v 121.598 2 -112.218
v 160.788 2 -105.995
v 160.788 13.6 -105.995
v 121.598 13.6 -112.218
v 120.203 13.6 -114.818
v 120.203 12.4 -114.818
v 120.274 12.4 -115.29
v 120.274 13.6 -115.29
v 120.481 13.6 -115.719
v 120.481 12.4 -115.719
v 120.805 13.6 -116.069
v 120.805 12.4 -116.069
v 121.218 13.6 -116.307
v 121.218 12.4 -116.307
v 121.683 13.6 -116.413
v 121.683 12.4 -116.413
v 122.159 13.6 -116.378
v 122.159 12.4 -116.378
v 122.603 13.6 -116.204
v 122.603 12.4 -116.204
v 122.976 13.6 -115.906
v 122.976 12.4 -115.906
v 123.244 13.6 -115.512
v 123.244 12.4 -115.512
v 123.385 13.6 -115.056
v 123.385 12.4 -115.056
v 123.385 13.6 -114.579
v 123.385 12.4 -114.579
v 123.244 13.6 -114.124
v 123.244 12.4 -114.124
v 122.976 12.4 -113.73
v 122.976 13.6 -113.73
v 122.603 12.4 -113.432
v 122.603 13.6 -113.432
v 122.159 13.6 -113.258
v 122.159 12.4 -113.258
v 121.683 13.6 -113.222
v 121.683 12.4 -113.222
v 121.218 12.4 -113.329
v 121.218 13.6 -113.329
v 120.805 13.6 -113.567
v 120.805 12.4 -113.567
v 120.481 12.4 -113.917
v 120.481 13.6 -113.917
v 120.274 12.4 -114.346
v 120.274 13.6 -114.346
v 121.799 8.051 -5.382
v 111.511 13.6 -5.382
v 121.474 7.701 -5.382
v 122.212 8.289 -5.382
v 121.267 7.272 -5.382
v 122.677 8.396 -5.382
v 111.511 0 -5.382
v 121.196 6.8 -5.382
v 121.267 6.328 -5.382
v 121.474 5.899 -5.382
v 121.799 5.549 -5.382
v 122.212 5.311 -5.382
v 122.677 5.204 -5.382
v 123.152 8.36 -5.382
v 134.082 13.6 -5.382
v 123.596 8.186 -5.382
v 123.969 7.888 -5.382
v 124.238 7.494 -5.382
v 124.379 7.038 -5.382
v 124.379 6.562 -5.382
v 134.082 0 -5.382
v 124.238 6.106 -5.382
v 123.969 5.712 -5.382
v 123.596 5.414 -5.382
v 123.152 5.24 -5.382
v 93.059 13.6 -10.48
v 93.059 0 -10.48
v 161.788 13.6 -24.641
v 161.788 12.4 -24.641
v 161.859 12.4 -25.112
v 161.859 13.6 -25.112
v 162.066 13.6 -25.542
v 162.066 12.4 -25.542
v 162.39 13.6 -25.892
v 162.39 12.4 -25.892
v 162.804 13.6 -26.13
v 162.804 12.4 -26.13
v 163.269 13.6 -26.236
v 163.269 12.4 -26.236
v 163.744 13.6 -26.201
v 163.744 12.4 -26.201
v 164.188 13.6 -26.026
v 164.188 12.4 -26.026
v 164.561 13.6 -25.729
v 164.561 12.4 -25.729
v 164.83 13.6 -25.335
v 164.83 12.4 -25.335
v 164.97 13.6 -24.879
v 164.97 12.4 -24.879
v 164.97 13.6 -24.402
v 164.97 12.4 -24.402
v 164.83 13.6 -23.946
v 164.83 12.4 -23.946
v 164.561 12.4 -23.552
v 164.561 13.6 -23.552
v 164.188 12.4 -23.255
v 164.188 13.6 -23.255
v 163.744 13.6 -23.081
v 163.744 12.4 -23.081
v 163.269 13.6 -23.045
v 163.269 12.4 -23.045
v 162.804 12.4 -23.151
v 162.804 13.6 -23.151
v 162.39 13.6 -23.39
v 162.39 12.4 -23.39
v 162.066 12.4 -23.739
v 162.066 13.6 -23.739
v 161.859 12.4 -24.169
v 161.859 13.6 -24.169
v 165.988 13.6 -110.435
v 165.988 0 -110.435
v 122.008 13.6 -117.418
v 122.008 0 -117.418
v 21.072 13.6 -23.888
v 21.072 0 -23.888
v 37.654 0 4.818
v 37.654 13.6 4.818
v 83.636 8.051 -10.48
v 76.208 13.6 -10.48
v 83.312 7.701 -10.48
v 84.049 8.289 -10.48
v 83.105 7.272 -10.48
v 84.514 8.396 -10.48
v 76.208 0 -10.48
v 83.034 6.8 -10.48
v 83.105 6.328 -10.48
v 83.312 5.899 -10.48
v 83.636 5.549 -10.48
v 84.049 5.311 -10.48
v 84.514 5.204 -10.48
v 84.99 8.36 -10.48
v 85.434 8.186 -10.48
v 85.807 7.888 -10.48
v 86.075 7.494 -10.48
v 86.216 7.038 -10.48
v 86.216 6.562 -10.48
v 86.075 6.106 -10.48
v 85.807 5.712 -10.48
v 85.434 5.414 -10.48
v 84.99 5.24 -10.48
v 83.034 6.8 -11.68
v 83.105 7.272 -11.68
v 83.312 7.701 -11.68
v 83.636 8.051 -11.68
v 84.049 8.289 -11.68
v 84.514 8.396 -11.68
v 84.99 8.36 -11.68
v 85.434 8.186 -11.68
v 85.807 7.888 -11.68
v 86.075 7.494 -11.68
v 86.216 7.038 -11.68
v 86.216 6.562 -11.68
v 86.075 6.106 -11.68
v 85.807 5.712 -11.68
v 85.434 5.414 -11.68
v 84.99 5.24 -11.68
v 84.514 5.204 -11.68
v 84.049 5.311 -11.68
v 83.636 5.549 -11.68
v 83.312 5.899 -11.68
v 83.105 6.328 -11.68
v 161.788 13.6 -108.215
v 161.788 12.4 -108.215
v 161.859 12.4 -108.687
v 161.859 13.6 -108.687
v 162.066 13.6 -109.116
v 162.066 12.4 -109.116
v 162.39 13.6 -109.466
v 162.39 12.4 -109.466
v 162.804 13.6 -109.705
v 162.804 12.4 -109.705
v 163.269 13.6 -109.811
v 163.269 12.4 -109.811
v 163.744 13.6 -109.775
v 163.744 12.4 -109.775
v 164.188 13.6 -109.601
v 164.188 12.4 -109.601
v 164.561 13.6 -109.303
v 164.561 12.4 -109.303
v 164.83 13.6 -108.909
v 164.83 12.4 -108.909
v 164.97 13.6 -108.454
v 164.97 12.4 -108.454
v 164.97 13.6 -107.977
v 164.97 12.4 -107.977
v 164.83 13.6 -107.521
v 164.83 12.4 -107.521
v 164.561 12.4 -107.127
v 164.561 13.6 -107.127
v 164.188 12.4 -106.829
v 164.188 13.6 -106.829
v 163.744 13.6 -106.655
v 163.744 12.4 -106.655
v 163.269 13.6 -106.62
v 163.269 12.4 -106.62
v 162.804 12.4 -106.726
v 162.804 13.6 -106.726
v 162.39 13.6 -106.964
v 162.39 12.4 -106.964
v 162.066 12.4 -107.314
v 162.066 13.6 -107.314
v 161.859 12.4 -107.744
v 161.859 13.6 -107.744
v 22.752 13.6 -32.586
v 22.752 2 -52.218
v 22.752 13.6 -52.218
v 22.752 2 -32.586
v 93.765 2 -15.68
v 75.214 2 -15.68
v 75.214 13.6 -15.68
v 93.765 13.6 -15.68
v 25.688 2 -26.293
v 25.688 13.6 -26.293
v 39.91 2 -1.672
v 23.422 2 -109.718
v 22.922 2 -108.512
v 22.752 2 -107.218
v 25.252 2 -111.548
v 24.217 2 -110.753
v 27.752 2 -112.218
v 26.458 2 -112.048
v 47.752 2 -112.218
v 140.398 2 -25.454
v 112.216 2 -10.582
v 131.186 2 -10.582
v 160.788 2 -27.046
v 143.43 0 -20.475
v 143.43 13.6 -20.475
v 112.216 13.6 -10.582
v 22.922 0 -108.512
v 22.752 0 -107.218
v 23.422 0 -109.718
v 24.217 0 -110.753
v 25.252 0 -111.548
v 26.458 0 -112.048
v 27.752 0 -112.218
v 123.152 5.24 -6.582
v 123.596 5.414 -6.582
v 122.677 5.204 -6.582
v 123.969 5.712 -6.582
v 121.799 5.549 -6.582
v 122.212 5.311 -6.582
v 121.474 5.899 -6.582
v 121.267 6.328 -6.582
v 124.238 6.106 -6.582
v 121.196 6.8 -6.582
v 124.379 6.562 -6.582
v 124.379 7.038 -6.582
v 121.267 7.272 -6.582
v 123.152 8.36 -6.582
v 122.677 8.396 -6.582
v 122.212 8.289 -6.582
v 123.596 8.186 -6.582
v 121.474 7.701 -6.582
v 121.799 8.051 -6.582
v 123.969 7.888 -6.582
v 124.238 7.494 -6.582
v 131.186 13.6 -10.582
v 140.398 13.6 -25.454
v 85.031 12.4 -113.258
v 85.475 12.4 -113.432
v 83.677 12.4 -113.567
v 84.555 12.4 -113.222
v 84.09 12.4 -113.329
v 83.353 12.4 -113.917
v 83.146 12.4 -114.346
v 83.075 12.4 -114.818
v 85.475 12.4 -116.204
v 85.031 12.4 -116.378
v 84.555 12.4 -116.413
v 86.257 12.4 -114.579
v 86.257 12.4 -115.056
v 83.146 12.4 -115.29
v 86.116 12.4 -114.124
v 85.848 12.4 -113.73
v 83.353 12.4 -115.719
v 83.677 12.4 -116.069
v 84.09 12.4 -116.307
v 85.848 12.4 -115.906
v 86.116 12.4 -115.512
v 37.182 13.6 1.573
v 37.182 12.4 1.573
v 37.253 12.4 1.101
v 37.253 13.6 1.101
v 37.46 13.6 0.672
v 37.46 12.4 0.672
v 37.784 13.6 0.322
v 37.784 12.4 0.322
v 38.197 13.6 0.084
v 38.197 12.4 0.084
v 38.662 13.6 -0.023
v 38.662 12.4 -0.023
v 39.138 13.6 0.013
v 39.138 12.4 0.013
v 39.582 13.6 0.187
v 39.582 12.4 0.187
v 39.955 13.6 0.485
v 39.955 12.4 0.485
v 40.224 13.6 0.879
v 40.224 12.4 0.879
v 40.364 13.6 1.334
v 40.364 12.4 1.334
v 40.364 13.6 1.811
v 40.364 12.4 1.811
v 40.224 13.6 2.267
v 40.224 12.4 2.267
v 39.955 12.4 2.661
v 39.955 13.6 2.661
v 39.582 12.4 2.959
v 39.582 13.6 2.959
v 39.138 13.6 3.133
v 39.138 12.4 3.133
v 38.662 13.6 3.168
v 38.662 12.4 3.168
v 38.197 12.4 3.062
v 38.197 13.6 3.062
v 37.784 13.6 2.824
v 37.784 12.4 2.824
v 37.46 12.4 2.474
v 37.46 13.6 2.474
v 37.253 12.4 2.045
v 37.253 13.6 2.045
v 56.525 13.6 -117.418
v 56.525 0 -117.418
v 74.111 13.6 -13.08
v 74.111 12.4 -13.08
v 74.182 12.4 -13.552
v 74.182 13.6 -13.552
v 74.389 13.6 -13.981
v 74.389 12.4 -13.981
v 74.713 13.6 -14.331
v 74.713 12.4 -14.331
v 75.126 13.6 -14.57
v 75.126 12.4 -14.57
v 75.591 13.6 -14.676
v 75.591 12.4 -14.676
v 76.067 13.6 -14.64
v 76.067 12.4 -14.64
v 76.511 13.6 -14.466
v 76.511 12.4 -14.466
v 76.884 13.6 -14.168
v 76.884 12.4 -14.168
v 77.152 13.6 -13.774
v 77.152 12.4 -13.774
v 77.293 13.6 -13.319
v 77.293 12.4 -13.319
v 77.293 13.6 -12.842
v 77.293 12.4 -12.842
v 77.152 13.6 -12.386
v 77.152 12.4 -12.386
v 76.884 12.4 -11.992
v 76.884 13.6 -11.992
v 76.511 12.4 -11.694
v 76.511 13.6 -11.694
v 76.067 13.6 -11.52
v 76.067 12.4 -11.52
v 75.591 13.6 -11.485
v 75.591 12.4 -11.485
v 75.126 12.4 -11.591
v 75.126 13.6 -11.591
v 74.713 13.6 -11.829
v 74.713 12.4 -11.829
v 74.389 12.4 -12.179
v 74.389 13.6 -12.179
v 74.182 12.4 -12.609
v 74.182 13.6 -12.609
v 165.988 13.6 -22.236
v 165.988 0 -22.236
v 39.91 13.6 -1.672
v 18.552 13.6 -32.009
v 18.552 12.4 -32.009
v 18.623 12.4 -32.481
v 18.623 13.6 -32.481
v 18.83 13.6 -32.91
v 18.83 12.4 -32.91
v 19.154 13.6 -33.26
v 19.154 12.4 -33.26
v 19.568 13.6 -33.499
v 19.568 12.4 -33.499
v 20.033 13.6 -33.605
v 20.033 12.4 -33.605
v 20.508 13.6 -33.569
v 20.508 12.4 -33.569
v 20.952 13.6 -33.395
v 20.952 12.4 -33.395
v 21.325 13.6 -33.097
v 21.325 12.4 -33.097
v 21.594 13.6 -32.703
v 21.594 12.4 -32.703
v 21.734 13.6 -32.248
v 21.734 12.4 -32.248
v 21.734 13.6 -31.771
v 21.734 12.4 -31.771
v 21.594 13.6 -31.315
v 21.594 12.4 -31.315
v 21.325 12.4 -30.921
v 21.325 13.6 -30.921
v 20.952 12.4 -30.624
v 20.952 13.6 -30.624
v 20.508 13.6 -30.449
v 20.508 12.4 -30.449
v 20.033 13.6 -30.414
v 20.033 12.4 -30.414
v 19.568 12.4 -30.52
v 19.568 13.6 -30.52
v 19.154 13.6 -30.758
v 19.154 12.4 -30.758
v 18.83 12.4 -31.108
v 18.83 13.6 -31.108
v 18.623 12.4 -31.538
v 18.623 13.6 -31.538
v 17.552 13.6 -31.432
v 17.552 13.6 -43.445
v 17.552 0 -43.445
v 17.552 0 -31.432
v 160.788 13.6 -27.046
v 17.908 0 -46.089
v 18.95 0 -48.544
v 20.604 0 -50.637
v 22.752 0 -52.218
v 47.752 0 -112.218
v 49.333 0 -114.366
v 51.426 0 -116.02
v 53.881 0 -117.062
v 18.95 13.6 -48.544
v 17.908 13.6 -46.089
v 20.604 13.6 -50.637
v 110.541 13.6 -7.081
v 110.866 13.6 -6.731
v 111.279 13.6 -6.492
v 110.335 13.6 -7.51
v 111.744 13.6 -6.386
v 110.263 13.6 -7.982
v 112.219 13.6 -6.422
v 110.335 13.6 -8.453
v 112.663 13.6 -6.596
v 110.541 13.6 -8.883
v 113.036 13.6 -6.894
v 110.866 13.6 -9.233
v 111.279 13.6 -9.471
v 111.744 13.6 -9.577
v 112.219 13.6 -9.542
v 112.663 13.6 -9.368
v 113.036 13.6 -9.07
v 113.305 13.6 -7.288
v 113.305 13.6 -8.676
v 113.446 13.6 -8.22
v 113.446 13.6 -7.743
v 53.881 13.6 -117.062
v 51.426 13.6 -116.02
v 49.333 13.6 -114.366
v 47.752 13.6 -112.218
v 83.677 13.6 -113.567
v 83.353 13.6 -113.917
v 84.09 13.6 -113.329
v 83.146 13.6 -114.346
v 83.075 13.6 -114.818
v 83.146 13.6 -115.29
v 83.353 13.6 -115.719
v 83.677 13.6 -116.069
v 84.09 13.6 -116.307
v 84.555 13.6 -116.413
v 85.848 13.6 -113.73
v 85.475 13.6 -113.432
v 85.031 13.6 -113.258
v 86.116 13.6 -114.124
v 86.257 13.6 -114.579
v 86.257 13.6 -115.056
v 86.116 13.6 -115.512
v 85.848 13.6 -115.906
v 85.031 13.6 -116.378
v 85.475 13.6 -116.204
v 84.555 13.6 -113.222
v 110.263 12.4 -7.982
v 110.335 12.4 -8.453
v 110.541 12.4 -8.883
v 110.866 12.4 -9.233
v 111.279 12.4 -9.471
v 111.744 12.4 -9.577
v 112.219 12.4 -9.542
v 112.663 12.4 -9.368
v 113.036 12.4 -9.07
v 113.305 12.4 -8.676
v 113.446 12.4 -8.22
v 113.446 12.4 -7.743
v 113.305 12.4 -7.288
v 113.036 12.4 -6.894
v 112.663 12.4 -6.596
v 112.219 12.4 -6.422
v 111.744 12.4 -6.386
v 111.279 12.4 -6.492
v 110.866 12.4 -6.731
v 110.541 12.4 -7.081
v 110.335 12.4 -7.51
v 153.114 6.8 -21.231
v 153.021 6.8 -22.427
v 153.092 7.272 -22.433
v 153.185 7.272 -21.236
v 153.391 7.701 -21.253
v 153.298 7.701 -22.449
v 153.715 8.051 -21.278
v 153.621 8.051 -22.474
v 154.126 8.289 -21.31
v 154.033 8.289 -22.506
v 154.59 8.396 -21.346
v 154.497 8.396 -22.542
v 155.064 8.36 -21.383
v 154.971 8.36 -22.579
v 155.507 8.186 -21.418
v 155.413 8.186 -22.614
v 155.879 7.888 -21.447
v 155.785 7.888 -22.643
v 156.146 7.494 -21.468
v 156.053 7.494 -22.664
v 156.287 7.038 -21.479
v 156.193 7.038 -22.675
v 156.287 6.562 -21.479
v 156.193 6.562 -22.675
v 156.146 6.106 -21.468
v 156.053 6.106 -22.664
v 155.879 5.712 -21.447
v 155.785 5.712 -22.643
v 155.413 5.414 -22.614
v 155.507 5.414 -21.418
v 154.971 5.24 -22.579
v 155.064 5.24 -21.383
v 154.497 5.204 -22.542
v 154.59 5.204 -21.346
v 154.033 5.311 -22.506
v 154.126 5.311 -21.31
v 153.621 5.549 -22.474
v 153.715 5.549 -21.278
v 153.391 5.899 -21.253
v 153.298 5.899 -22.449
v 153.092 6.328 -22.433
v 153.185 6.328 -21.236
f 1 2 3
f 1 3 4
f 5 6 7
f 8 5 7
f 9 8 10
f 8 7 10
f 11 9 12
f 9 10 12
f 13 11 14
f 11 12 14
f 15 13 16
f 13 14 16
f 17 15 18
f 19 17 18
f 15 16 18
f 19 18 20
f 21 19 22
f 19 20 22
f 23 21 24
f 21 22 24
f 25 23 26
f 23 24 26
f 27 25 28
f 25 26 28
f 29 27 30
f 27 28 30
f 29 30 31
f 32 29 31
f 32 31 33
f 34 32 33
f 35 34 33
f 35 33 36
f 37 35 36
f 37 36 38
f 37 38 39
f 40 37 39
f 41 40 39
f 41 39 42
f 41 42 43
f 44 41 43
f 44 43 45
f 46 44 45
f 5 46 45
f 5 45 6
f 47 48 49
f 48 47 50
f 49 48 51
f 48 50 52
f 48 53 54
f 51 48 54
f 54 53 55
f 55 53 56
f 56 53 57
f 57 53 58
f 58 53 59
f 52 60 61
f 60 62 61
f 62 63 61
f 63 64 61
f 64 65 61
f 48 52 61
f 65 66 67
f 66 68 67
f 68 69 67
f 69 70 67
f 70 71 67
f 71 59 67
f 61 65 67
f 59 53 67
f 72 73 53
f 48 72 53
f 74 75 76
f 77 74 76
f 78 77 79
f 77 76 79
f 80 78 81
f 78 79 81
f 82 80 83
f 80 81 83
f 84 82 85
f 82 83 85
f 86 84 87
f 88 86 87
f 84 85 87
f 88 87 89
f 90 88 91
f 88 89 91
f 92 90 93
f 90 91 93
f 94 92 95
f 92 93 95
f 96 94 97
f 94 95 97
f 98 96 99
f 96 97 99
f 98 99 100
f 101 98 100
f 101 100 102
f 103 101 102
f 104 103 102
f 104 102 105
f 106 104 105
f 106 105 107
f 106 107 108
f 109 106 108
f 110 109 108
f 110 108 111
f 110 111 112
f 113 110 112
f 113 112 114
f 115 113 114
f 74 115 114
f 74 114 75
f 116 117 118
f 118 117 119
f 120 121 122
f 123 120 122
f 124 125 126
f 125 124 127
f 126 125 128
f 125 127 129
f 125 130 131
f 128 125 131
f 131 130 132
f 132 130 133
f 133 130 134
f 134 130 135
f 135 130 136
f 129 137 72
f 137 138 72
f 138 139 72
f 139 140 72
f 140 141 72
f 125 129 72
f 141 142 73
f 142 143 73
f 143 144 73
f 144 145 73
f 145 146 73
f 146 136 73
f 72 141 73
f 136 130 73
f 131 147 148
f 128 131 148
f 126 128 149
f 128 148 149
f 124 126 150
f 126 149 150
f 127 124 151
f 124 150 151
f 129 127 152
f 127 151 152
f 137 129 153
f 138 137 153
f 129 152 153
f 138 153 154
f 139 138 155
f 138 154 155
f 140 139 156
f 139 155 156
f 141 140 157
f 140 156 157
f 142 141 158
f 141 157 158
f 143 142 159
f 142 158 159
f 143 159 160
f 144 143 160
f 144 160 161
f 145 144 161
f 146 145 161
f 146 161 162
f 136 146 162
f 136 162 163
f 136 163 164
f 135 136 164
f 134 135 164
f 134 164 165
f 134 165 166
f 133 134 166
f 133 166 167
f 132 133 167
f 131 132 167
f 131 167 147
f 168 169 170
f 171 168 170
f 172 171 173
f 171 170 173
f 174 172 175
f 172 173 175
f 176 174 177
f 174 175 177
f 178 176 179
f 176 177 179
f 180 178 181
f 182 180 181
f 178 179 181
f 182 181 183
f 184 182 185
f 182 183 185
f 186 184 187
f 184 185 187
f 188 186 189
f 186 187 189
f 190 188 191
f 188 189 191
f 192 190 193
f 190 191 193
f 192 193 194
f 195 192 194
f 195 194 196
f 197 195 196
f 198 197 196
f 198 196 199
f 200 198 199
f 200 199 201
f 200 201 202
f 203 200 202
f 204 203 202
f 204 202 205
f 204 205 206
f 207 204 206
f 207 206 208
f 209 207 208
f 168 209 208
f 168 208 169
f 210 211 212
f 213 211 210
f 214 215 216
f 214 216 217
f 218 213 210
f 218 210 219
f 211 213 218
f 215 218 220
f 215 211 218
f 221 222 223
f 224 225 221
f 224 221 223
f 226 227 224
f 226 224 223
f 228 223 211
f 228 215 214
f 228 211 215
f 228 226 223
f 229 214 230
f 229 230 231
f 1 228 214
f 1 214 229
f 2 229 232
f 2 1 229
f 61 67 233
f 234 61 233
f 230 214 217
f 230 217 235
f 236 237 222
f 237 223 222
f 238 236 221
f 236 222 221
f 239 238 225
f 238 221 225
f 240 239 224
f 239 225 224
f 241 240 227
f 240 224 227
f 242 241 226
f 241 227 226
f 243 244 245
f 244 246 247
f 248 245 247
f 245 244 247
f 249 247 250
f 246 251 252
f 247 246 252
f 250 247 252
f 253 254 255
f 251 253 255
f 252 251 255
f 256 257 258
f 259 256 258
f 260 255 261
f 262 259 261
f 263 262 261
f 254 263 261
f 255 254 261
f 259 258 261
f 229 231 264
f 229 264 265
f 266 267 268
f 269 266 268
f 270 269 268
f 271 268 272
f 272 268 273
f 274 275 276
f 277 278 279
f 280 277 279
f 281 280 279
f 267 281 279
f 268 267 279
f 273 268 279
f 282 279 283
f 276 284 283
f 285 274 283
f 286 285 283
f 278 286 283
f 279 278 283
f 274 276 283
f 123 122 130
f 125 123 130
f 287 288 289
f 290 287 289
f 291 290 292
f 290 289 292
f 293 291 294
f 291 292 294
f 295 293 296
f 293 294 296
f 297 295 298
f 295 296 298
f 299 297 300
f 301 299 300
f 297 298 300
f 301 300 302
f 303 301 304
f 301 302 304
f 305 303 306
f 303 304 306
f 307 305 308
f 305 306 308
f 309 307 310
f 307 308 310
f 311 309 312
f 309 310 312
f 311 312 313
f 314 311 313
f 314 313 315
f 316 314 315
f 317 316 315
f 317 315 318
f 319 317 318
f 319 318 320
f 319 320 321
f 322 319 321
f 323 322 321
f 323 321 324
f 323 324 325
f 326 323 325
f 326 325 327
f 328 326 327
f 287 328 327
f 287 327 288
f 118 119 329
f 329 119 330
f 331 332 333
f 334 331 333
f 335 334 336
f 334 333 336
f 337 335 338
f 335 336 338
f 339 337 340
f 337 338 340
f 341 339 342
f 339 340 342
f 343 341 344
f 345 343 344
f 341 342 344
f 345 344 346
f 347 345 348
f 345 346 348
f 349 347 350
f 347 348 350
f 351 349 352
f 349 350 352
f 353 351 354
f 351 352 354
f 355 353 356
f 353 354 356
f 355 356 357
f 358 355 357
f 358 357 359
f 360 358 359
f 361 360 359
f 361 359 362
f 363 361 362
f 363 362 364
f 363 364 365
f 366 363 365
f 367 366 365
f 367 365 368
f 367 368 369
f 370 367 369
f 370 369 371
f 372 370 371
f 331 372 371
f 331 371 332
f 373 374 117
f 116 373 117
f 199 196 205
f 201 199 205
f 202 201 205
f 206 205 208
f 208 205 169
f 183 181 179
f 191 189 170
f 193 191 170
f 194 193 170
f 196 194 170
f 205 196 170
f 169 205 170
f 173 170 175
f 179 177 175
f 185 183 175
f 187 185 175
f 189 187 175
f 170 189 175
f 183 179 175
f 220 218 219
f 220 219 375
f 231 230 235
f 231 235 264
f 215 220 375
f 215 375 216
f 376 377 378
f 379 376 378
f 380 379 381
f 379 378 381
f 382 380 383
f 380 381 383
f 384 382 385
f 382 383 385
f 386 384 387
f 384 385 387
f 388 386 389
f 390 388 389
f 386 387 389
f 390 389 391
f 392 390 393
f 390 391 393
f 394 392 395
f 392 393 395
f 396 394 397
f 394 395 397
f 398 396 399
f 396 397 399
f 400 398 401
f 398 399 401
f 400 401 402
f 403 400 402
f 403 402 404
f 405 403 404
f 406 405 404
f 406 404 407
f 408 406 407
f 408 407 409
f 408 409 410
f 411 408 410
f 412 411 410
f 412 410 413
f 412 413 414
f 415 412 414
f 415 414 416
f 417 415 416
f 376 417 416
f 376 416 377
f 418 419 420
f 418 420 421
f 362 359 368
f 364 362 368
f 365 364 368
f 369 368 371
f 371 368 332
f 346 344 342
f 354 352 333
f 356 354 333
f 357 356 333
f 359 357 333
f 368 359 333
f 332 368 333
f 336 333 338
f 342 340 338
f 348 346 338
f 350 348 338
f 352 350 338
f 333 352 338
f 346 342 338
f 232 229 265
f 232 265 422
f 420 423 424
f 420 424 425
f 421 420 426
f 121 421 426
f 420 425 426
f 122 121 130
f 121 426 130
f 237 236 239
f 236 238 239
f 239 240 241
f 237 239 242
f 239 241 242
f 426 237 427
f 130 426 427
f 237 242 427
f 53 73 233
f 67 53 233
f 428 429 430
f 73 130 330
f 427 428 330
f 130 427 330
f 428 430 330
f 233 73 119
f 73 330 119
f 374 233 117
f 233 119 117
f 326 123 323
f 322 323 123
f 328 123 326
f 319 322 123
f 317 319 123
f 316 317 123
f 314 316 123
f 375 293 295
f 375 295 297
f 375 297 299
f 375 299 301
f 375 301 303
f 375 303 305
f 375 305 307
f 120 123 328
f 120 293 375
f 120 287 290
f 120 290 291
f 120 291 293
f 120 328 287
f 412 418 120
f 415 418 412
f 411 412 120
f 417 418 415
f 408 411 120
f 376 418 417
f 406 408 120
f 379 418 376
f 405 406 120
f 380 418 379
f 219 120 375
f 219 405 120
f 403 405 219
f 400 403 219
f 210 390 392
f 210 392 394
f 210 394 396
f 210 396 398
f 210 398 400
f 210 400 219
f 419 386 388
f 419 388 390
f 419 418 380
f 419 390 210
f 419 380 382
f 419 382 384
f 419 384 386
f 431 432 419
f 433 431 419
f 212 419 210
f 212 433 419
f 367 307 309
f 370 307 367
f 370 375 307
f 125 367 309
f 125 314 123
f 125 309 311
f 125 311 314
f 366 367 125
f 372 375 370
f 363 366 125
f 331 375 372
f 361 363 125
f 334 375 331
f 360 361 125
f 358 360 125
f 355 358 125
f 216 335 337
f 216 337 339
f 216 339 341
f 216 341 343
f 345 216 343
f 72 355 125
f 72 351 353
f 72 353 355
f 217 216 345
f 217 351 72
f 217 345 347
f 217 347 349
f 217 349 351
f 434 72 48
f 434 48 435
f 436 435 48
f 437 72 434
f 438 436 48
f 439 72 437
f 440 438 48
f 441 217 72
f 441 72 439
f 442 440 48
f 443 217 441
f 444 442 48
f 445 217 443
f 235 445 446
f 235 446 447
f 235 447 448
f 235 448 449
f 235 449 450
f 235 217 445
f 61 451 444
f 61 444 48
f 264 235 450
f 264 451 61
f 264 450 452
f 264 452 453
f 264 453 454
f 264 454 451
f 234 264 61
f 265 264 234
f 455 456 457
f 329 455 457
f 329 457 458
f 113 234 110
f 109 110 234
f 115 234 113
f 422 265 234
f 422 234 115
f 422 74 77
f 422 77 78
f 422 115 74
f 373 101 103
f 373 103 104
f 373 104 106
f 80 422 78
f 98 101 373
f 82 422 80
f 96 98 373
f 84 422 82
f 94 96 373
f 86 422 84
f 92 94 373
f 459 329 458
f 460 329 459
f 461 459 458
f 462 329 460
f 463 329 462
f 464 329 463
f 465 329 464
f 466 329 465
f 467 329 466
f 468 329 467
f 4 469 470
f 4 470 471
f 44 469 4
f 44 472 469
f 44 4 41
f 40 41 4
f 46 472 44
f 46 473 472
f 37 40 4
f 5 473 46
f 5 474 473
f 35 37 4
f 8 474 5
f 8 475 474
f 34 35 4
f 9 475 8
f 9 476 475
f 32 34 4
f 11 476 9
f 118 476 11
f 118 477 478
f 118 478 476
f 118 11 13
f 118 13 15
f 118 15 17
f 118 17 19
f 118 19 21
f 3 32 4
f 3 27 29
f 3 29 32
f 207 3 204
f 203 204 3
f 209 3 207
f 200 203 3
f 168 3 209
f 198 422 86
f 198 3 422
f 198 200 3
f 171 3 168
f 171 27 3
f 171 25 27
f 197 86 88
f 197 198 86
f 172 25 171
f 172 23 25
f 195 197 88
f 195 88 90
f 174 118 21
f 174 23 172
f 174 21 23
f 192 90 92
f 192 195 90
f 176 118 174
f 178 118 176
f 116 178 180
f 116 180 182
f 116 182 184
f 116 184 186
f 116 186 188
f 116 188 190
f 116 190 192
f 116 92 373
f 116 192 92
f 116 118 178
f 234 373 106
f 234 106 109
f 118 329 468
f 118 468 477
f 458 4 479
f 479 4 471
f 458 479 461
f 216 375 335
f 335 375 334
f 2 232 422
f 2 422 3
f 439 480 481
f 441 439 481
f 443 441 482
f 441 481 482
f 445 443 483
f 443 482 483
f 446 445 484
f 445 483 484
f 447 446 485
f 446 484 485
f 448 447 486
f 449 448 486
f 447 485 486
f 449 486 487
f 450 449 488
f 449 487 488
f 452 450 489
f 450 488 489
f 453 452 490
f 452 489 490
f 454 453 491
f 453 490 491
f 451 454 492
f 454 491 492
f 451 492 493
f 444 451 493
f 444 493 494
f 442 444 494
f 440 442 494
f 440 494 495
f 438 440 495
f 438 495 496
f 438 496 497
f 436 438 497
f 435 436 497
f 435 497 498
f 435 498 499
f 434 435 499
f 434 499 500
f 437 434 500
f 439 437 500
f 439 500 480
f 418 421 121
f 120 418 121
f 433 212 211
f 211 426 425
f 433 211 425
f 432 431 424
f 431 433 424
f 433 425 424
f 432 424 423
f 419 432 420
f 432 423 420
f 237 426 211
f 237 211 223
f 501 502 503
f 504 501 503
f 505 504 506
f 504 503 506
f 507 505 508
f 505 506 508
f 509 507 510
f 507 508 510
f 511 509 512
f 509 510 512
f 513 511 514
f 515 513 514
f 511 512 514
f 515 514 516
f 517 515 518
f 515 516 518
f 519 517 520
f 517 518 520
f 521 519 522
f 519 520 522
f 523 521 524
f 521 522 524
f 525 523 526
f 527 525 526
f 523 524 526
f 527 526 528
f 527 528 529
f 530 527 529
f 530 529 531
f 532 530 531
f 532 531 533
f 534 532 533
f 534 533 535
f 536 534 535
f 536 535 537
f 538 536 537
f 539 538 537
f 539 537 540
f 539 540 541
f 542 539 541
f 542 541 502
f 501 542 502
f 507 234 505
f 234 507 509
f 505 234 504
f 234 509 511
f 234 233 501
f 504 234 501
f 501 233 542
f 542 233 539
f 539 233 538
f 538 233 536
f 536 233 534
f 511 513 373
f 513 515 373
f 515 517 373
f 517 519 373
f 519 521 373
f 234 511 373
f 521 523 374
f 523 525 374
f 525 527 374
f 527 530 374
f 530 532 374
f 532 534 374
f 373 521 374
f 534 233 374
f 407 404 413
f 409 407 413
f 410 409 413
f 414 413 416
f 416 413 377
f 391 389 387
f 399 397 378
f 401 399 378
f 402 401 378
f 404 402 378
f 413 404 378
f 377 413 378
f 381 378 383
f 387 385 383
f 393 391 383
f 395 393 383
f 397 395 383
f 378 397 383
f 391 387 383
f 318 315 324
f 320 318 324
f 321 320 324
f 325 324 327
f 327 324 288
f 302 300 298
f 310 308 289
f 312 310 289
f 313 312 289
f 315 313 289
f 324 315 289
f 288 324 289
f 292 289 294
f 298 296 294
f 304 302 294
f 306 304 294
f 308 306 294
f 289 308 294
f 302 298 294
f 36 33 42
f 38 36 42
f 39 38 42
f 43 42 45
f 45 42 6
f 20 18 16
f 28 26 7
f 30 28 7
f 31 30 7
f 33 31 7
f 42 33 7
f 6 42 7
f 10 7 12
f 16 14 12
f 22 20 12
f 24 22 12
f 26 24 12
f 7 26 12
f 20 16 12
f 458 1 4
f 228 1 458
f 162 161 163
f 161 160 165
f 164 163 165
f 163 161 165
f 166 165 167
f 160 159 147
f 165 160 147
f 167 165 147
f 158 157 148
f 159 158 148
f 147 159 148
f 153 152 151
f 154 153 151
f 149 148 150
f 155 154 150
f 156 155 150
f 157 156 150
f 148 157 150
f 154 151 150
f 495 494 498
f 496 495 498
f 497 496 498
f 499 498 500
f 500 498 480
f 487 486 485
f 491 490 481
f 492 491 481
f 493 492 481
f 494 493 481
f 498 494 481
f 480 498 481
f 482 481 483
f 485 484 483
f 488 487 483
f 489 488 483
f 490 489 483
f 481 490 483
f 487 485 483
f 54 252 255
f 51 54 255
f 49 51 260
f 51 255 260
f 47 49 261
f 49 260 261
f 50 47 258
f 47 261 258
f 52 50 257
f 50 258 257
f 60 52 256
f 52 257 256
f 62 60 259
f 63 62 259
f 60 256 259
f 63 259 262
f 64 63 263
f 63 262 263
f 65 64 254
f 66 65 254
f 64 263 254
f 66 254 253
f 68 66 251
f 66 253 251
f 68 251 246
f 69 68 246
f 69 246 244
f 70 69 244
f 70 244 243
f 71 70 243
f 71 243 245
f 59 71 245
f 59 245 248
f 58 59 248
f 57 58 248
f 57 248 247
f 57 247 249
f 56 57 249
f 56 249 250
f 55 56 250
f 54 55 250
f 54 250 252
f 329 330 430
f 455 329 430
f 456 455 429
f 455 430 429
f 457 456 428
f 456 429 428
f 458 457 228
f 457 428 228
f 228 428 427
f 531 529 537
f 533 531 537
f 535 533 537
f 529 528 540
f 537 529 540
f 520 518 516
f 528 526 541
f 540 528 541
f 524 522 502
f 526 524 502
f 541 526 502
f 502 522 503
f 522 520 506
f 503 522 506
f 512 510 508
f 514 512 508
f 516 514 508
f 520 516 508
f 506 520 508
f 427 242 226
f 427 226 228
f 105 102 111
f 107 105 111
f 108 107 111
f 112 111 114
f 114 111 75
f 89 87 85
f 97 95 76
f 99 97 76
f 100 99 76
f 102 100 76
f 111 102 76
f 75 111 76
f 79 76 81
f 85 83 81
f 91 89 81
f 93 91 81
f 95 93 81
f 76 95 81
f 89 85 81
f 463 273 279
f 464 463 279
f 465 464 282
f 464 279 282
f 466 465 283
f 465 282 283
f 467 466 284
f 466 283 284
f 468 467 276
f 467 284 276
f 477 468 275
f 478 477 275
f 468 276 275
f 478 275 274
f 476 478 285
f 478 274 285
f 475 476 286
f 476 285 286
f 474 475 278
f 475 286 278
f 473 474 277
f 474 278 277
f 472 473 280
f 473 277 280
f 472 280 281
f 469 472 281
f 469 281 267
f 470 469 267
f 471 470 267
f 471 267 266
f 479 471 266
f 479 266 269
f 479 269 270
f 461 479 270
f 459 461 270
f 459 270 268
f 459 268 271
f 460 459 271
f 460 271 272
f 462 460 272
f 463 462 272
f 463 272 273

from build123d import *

# Parameters (mm, degrees)
BOSS_EXTRUDE1_DEPTH = 2
BOSS_EXTRUDE2_DEPTH = 13.6
CUT_EXTRUDE1_DEPTH  = 204.774312539
TOP_HOLES_D         = 3.2
TOP_HOLES_DEPTH     = 1.2
WRIST_1_D           = 3.2
WRIST_1_DEPTH       = 1.2
WRIST_2_D           = 3.2
WRIST_2_DEPTH       = 1.2
WRIST_3_D           = 3.2
WRIST_3_DEPTH       = 1.2
FILLET1_R           = 5
FILLET2_R           = 10
FILLET3_R           = 10


with BuildPart() as part:
    # outline → Boss-Extrude1 (new body)
    with BuildSketch(Plane(origin=(0, 0, 0), x_dir=(1, 0, 0), z_dir=(0, 1, 0))):
        Polygon((22.752080985, 112.217917805), (22.752080985, 32.585832501), (25.688129691, 26.292829341), (39.910245267, 1.671913524), (75.213887712, 15.680109343), (93.764616437, 15.680109343), (112.21601573, 10.581860359), (131.186066133, 10.581860359), (140.397681326, 25.454275085), (160.788080985, 27.045655036), (160.788080985, 105.9953847), (121.597788595, 112.217917805), align=None)
    extrude(amount=BOSS_EXTRUDE1_DEPTH)

    # outline<7> → Boss-Extrude2 (add)
    with BuildSketch(Plane(origin=(0, 0, 0), x_dir=(1, 0, 0), z_dir=(0, 1, 0))):
        Polygon((165.988080985, 110.434880876), (122.008040315, 117.417917805), (17.552080985, 117.417917805), (17.552080985, 31.432460189), (21.071788866, 23.888466533), (37.653795388, -4.817824349), (76.207852469, 10.480109343), (93.059430407, 10.480109343), (111.510829699, 5.381860359), (134.081949487, 5.381860359), (143.430369308, 20.475150048), (165.988080985, 22.235679058), align=None)
        Polygon((121.597788595, 112.217917805), (22.752080985, 112.217917805), (22.752080985, 32.585832501), (25.688129691, 26.292829341), (39.910245267, 1.671913524), (75.213887712, 15.680109343), (93.764616437, 15.680109343), (112.21601573, 10.581860359), (131.186066133, 10.581860359), (140.397681326, 25.454275085), (160.788080985, 27.045655036), (160.788080985, 105.9953847), align=None, mode=Mode.SUBTRACT)
    extrude(amount=BOSS_EXTRUDE2_DEPTH)

    # cutout → Cut-Extrude1 (cut, through all)
    with BuildSketch(Plane(origin=(0, 0, 0), x_dir=(1, 0, 0), z_dir=(0, 1, 0))):
        Polygon((17.552080985, 117.417917805), (17.552080985, 52.217917805), (22.752080985, 52.217917805), (22.752080985, 112.217917805), (47.752080985, 112.217917805), (47.752080985, 117.417917805), align=None)
    extrude(amount=CUT_EXTRUDE1_DEPTH, mode=Mode.SUBTRACT)

    # top holes
    with Locations(Plane(origin=(0, 13.6, 0), x_dir=(1, 0, 0), z_dir=(0, 1, 0))):
        with Locations((84.67493479, 114.817917805), (20.152080985, 32.009146345), (38.782020327, -1.572955412), (75.710870091, 13.080109343), (111.863422715, 7.981860359), (163.388080985, 24.640667047), (163.388080985, 108.215132788), (121.802914455, 114.817917805)):
            Hole(TOP_HOLES_D / 2, depth=TOP_HOLES_DEPTH)

    # wrist 1
    with Locations(Plane.XY.offset(-10.480109343)):
        with Locations((84.633641438, 6.8)):
            Hole(WRIST_1_D / 2, depth=WRIST_1_DEPTH)

    # wrist 2
    with Locations(Plane.XY.offset(-5.381860359)):
        with Locations((122.796389593, 6.8)):
            Hole(WRIST_2_D / 2, depth=WRIST_2_DEPTH)

    # wrist 3
    with Locations(Plane(origin=(-0.719959147, 0, -9.224858415), x_dir=(0.9969682889311796, 0, -0.07780893821172487), z_dir=(0.07780893821172487, 0, 0.9969682889311796))):
        with Locations((155.901833608, 6.8)):
            Hole(WRIST_3_D / 2, depth=WRIST_3_DEPTH)

    # Fillet1
    fillet1_edges = [part.edges().sort_by_distance(p)[0] for p in [
        (22.752080985, 1, -112.217917805),
    ]]
    fillet(fillet1_edges, radius=FILLET1_R)

    # Fillet2
    # the kernel refuses this fillet: 10 mm, written as the material it takes off along each edge
    with BuildSketch(Plane(origin=(47.752080985, -21.931712199, -117.417917805), x_dir=(0, 0, 1), z_dir=(0, 1, 0))) as fillet2_piece_1:
        with BuildLine():
            CenterArc((10, 8.77268488), FILLET2_R, 180, 61.314597986)
            Line((0, 8.77268488), (-0.2, 8.77268488))
            Line((-0.2, 8.77268488), (-0.2, 0))
            Line((-0.2, 0), (0, -0.2))
            ThreePointArc((0, -0.2), (2.6, -0.2), (5.104, -0.175453698))
            Line((5.104, -0.175453698), (5.2, 0))
        make_face()
    extrude(amount=57.463424399, mode=Mode.SUBTRACT)

    # Fillet3
    # the kernel refuses this fillet: 10 mm, written as the material it takes off along each edge
    with BuildSketch(Plane(origin=(17.552080985, -21.931712199, -52.217917805), x_dir=(0, 0, 1), z_dir=(0, 1, 0))) as fillet3_piece_1:
        with BuildLine():
            CenterArc((8.77268488, 10), FILLET3_R, 208.685402014, 61.314597986)
            Line((0, 5.2), (-0.175453698, 5.104))
            ThreePointArc((-0.175453698, 5.104), (-0.2, 2.6), (-0.2, 0))
            Line((-0.2, 0), (0, -0.2))
            Line((0, -0.2), (8.77268488, -0.2))
            Line((8.77268488, -0.2), (8.77268488, 0))
        make_face()
    extrude(amount=57.463424399, mode=Mode.SUBTRACT)


solid = part.part
